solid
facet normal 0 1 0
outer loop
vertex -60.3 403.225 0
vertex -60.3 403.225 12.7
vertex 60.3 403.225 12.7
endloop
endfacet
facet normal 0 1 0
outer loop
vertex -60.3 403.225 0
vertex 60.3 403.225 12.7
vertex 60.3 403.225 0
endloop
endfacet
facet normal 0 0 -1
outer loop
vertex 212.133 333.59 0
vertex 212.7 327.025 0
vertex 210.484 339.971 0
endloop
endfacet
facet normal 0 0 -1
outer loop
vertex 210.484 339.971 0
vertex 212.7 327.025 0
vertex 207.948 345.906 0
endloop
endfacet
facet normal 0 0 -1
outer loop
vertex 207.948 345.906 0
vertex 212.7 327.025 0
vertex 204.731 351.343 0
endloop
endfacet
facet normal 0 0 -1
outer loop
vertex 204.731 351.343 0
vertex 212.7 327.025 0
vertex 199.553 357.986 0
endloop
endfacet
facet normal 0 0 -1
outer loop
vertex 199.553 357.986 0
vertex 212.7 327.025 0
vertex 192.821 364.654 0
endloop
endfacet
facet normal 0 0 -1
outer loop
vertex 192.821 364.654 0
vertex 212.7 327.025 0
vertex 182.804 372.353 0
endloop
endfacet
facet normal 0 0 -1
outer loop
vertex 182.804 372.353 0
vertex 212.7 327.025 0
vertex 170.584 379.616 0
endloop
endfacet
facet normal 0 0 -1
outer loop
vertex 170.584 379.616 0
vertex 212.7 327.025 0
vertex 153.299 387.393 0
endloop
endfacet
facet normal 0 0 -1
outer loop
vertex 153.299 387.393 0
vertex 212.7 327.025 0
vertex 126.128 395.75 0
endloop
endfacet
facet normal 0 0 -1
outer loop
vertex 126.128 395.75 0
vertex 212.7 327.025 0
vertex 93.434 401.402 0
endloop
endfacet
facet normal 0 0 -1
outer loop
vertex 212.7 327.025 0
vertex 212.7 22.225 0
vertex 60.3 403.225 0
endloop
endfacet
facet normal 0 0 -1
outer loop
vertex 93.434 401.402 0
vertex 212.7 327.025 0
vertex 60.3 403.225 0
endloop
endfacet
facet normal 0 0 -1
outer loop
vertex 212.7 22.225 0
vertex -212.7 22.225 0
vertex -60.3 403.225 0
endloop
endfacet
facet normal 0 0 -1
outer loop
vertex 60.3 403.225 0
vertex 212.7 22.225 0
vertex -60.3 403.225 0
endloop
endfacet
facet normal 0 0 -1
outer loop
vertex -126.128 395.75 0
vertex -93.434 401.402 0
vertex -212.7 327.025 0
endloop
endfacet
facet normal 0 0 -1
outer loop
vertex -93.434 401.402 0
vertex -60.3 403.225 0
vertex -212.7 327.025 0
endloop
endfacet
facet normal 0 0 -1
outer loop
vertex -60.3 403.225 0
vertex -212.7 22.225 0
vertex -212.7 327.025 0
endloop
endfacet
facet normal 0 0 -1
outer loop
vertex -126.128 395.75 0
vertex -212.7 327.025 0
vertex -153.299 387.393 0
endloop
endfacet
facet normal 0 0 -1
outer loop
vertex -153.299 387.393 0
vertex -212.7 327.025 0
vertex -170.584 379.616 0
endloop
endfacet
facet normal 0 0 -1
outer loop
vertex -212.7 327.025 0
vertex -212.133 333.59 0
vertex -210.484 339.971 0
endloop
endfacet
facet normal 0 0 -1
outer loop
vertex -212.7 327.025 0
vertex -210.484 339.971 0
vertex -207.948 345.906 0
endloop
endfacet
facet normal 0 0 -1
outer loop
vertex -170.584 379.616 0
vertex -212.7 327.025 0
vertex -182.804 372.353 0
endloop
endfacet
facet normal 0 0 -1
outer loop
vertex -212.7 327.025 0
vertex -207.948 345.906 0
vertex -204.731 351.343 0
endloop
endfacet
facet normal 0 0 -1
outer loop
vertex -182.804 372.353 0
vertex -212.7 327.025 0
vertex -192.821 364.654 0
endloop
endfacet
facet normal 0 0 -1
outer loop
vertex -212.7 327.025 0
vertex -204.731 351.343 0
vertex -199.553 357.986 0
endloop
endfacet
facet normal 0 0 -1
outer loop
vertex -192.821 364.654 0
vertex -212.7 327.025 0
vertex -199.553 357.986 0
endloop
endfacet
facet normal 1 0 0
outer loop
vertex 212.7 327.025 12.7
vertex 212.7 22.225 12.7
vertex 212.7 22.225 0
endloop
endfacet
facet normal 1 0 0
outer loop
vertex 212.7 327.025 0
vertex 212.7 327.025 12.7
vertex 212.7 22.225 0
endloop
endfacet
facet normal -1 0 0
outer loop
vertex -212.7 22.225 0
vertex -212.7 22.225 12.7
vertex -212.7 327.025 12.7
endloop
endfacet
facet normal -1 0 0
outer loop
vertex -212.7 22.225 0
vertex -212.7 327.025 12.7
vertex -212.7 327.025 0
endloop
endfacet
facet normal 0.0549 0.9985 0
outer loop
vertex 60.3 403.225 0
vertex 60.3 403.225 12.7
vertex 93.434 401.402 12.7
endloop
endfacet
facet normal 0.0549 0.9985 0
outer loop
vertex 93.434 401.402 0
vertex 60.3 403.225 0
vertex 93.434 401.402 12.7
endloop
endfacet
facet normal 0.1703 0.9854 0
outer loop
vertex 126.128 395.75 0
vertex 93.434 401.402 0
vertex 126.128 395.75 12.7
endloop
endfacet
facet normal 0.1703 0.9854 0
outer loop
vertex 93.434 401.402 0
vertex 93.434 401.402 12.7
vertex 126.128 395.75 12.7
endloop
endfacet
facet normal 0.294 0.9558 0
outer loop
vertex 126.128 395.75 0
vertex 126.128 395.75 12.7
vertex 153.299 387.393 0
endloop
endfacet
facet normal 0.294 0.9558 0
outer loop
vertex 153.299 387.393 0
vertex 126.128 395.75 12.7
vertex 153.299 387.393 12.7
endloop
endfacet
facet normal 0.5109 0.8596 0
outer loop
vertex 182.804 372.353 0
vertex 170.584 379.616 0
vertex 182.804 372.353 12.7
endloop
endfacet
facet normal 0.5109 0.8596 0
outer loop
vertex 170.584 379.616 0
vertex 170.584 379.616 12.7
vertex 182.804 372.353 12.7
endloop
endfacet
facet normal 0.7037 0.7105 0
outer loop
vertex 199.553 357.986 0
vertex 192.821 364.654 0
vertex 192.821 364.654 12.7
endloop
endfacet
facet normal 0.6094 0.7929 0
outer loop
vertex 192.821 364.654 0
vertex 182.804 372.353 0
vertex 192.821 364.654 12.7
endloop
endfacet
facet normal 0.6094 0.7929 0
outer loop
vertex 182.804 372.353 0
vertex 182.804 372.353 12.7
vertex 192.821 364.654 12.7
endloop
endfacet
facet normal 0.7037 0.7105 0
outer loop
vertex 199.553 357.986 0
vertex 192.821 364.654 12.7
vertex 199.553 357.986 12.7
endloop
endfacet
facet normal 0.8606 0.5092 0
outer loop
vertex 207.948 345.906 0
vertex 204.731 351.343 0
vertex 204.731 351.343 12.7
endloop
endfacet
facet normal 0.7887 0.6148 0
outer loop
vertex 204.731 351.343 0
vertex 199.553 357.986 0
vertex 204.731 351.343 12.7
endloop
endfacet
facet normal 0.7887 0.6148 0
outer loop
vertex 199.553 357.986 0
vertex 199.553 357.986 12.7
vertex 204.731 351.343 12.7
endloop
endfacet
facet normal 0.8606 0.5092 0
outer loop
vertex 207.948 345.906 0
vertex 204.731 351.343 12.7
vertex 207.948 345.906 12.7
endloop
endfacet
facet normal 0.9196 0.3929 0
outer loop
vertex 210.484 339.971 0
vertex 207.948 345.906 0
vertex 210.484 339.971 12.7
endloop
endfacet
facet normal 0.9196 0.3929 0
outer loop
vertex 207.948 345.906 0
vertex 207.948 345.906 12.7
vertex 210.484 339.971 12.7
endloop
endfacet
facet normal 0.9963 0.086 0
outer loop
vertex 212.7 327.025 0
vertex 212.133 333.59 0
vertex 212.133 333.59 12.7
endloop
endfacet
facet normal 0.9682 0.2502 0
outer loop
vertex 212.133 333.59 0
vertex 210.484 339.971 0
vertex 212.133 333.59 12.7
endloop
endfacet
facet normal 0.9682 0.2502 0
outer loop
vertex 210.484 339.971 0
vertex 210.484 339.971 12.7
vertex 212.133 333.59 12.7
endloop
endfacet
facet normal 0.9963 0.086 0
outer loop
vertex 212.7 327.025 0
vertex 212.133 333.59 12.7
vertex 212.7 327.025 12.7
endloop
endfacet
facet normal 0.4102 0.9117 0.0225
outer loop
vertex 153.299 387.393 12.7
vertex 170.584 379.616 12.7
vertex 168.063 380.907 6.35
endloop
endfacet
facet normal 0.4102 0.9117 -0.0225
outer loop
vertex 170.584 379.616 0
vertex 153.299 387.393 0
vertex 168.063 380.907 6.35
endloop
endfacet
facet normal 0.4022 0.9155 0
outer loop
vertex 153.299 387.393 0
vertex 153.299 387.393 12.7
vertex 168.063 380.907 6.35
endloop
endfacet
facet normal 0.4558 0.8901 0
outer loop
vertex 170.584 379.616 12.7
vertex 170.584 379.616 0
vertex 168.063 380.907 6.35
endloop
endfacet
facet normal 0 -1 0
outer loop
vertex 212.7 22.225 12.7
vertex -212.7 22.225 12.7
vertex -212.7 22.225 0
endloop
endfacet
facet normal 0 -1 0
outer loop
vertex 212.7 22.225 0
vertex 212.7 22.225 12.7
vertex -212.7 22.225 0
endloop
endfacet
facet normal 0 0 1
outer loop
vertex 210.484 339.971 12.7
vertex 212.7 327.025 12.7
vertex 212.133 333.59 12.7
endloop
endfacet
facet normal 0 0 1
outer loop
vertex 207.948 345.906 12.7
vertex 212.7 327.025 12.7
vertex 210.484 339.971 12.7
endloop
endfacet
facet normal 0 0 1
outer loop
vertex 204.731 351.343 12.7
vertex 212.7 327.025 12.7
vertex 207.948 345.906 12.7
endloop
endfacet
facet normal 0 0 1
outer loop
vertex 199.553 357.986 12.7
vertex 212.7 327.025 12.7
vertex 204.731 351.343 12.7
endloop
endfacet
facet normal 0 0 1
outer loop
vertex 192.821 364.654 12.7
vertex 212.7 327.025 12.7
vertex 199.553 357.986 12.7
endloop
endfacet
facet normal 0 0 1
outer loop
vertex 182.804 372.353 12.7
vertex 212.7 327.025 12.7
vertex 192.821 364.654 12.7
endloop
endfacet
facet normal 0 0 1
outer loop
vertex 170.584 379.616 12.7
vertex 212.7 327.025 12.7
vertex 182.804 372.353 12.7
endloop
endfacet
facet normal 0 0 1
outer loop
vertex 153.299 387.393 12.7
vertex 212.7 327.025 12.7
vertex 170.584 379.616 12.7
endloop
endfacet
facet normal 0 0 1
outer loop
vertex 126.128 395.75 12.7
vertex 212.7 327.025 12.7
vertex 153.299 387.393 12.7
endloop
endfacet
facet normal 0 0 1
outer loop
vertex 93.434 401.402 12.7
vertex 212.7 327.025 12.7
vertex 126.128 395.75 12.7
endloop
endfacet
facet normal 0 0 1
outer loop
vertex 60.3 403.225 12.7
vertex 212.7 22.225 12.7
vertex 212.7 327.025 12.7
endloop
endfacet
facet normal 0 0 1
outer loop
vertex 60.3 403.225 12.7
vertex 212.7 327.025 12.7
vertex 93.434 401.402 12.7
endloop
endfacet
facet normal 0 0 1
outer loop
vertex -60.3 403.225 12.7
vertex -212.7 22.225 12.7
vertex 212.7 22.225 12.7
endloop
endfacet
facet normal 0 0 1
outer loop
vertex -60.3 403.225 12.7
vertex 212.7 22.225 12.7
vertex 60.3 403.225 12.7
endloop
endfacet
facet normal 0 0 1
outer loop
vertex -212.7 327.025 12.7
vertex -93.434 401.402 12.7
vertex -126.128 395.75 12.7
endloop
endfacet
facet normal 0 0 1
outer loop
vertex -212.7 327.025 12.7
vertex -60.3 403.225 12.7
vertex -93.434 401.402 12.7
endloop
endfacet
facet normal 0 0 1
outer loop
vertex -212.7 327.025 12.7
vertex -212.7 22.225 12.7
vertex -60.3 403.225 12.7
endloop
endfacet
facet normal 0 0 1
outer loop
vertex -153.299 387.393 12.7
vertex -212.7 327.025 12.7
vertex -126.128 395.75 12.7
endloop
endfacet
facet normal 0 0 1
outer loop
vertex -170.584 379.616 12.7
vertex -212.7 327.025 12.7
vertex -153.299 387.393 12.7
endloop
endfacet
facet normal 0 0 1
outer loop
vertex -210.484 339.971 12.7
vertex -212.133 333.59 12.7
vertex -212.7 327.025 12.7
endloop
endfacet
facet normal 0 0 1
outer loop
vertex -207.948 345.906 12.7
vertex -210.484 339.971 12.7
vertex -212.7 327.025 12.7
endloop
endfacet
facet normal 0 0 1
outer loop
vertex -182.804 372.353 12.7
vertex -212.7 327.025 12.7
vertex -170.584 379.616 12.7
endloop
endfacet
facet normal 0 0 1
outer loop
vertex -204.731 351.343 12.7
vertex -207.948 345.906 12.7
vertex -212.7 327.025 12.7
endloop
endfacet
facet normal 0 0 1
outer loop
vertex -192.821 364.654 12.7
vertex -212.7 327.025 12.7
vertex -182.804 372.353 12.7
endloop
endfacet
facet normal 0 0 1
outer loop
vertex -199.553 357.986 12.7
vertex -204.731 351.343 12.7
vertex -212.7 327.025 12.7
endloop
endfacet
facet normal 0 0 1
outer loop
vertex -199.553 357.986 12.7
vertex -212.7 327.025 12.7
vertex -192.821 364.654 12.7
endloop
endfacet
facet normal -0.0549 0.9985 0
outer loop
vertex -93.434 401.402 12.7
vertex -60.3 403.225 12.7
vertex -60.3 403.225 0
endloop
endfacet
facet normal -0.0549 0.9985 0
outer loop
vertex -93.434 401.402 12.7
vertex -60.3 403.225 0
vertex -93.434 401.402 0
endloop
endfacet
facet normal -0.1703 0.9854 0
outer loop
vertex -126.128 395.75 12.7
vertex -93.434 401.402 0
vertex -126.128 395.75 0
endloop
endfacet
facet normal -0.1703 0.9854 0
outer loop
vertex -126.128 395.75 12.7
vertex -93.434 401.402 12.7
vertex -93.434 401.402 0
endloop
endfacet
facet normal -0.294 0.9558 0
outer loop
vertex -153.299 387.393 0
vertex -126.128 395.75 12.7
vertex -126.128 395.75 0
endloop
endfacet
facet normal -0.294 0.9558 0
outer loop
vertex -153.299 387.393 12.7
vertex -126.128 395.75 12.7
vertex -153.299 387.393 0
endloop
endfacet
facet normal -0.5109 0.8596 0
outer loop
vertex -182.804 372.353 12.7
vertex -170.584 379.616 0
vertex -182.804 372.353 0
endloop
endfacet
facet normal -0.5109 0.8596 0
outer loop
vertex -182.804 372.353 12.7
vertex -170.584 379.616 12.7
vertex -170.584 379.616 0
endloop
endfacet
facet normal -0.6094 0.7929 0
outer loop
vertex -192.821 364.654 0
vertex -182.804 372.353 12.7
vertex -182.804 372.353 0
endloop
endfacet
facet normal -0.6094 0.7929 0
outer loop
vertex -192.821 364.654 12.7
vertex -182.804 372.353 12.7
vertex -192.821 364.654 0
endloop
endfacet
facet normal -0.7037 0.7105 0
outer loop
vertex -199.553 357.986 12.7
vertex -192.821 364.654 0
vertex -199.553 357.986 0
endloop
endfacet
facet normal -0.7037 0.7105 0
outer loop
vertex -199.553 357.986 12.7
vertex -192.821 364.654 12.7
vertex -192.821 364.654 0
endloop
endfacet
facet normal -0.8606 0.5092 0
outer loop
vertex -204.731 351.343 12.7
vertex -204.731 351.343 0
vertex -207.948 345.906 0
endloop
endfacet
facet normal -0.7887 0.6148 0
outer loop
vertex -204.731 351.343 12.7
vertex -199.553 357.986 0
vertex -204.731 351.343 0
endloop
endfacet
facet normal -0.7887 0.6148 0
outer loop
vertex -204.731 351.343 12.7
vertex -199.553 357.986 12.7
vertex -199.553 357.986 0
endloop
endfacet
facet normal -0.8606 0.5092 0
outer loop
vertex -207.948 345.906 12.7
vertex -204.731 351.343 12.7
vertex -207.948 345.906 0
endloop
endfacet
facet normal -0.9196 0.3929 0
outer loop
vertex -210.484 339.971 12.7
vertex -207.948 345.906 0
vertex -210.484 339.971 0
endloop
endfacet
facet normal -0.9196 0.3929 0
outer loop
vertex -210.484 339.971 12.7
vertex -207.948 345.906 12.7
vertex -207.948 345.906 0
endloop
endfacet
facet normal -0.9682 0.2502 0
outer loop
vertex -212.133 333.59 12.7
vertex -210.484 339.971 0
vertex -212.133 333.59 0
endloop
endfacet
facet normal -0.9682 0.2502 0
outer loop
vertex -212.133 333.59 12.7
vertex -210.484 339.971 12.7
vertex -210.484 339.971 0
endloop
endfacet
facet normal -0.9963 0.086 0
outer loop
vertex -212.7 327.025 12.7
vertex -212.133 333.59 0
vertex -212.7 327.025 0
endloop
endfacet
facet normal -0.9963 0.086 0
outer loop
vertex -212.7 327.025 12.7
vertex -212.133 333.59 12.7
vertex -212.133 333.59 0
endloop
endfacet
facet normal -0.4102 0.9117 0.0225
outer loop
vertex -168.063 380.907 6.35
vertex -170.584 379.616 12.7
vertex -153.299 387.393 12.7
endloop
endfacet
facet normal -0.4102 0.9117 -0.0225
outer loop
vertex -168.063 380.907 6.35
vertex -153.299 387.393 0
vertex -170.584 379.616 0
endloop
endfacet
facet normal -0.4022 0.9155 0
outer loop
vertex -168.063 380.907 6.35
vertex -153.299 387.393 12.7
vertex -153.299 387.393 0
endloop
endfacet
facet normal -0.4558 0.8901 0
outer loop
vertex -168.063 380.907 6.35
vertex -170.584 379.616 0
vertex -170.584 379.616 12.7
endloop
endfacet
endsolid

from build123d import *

# Parameters (mm, degrees)
BOSS_EXTRUDE1_DEPTH      = 212.7
BOSS_EXTRUDE1_DEPTH_BACK = 212.7
SKETCH2_W                = 12.7
SKETCH2_H                = 381
FILLET1_SIZE             = 152.4
FILLET1_SIZE_2           = 76.2


with BuildPart() as part:
    # Sketch2 → Boss-Extrude1 (new, two sides: drawn at the far end of the back side and taken through both)
    with BuildSketch(Plane(origin=(0, 0, 0), x_dir=(0, 0, -1), z_dir=(1, 0, 0)).offset(-BOSS_EXTRUDE1_DEPTH_BACK)):
        with Locations((-6.35, 212.725)):
            Rectangle(SKETCH2_W, SKETCH2_H)
    extrude(amount=BOSS_EXTRUDE1_DEPTH + BOSS_EXTRUDE1_DEPTH_BACK)

    # Fillet1
    # an asymmetric fillet: 152.4, 76.2 mm, written as the material it takes off along each edge
    with BuildSketch(Plane(origin=(212.7, 403.225, 393.7), x_dir=(-1, 0, 0), z_dir=(0, 0, -1))) as fillet1_piece_1:
        with BuildLine():
            Bezier((FILLET1_SIZE, 0), (0, 0), (0, -FILLET1_SIZE_2), weights=[1, 0.707106781, 1])
            Line((0, -FILLET1_SIZE_2), (0, 0))
            Line((0, 0), (FILLET1_SIZE, 0))
        make_face()
    extrude(amount=774.7, mode=Mode.SUBTRACT)
    with BuildSketch(Plane(origin=(-212.7, 403.225, 393.7), x_dir=(1, 0, 0), z_dir=(0, 0, -1))) as fillet1_piece_2:
        with BuildLine():
            Bezier((FILLET1_SIZE, 0), (0, 0), (0, FILLET1_SIZE_2), weights=[1, 0.707106781, 1])
            Line((0, FILLET1_SIZE_2), (0, 0))
            Line((0, 0), (FILLET1_SIZE, 0))
        make_face()
    extrude(amount=774.7, mode=Mode.SUBTRACT)


solid = part.part
